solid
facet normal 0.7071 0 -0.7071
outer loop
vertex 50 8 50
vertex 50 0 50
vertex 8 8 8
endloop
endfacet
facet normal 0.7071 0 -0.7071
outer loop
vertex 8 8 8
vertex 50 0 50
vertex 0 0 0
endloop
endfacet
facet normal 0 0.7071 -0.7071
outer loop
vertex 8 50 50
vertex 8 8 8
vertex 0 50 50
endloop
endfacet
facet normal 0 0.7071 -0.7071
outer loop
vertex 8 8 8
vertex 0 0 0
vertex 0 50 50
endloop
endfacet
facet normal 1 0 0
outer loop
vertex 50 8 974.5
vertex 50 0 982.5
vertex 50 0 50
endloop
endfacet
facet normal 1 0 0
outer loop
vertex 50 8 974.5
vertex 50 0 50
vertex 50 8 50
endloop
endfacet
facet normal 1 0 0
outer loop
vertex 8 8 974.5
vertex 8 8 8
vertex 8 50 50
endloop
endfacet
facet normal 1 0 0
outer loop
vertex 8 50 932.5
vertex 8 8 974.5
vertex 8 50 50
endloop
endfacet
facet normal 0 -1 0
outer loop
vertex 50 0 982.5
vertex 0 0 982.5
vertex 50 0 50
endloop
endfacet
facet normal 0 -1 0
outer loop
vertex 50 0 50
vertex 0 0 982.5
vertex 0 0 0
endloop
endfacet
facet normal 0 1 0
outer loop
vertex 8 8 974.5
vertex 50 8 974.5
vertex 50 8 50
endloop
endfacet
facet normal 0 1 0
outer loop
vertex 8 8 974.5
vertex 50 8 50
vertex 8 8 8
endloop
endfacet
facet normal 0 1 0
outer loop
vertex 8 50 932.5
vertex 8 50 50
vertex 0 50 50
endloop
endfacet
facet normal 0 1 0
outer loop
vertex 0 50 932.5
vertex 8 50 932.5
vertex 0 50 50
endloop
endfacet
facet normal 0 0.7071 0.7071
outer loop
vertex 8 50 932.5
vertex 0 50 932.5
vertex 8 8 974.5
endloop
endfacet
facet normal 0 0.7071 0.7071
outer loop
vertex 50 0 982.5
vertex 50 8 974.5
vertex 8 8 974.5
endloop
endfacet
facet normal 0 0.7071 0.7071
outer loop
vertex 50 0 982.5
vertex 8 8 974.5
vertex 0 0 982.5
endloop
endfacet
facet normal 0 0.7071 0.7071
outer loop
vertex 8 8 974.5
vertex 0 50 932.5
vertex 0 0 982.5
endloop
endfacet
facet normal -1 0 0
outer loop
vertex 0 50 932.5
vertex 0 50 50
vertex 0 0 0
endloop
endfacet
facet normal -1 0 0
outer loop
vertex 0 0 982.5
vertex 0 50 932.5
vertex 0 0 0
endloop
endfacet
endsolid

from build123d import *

# Parameters (mm, degrees)
F1_DEPTH = 982.5
F3_DEPTH = 50.001
F5_DEPTH = 8
F7_DEPTH = 8


with BuildPart() as f1:
    # F0 (on Top) → F1 (new body)
    with BuildSketch(Plane.XY):
        Polygon((0, 50), (0, 0), (50, 0), (50, 8), (8, 8), (8, 50), align=None)
    extrude(amount=F1_DEPTH)

    # F2 (on face) → F3 (cut, through all)
    with BuildSketch(Plane(origin=(0, 0, 0), x_dir=(0, -1, 0), z_dir=(-1, 0, 0))):
        Polygon((-50, 932.5), (0, 982.5), (-50, 982.5), align=None)
    extrude(amount=-F3_DEPTH, mode=Mode.SUBTRACT)

    # F4 (on face) → F5 (cut, through all)
    with BuildSketch(Plane.XZ):
        Polygon((50, 50), (0, 0), (50, 0), align=None)
    extrude(amount=-F5_DEPTH, mode=Mode.SUBTRACT)

    # F6 (on face) → F7 (cut, through all)
    with BuildSketch(Plane(origin=(0, 0, 0), x_dir=(0, -1, 0), z_dir=(-1, 0, 0))):
        Polygon((-8, 0), (0, 0), (-50, 50), (-50, 0), align=None)
    extrude(amount=-F7_DEPTH, mode=Mode.SUBTRACT)


solid = f1.part
